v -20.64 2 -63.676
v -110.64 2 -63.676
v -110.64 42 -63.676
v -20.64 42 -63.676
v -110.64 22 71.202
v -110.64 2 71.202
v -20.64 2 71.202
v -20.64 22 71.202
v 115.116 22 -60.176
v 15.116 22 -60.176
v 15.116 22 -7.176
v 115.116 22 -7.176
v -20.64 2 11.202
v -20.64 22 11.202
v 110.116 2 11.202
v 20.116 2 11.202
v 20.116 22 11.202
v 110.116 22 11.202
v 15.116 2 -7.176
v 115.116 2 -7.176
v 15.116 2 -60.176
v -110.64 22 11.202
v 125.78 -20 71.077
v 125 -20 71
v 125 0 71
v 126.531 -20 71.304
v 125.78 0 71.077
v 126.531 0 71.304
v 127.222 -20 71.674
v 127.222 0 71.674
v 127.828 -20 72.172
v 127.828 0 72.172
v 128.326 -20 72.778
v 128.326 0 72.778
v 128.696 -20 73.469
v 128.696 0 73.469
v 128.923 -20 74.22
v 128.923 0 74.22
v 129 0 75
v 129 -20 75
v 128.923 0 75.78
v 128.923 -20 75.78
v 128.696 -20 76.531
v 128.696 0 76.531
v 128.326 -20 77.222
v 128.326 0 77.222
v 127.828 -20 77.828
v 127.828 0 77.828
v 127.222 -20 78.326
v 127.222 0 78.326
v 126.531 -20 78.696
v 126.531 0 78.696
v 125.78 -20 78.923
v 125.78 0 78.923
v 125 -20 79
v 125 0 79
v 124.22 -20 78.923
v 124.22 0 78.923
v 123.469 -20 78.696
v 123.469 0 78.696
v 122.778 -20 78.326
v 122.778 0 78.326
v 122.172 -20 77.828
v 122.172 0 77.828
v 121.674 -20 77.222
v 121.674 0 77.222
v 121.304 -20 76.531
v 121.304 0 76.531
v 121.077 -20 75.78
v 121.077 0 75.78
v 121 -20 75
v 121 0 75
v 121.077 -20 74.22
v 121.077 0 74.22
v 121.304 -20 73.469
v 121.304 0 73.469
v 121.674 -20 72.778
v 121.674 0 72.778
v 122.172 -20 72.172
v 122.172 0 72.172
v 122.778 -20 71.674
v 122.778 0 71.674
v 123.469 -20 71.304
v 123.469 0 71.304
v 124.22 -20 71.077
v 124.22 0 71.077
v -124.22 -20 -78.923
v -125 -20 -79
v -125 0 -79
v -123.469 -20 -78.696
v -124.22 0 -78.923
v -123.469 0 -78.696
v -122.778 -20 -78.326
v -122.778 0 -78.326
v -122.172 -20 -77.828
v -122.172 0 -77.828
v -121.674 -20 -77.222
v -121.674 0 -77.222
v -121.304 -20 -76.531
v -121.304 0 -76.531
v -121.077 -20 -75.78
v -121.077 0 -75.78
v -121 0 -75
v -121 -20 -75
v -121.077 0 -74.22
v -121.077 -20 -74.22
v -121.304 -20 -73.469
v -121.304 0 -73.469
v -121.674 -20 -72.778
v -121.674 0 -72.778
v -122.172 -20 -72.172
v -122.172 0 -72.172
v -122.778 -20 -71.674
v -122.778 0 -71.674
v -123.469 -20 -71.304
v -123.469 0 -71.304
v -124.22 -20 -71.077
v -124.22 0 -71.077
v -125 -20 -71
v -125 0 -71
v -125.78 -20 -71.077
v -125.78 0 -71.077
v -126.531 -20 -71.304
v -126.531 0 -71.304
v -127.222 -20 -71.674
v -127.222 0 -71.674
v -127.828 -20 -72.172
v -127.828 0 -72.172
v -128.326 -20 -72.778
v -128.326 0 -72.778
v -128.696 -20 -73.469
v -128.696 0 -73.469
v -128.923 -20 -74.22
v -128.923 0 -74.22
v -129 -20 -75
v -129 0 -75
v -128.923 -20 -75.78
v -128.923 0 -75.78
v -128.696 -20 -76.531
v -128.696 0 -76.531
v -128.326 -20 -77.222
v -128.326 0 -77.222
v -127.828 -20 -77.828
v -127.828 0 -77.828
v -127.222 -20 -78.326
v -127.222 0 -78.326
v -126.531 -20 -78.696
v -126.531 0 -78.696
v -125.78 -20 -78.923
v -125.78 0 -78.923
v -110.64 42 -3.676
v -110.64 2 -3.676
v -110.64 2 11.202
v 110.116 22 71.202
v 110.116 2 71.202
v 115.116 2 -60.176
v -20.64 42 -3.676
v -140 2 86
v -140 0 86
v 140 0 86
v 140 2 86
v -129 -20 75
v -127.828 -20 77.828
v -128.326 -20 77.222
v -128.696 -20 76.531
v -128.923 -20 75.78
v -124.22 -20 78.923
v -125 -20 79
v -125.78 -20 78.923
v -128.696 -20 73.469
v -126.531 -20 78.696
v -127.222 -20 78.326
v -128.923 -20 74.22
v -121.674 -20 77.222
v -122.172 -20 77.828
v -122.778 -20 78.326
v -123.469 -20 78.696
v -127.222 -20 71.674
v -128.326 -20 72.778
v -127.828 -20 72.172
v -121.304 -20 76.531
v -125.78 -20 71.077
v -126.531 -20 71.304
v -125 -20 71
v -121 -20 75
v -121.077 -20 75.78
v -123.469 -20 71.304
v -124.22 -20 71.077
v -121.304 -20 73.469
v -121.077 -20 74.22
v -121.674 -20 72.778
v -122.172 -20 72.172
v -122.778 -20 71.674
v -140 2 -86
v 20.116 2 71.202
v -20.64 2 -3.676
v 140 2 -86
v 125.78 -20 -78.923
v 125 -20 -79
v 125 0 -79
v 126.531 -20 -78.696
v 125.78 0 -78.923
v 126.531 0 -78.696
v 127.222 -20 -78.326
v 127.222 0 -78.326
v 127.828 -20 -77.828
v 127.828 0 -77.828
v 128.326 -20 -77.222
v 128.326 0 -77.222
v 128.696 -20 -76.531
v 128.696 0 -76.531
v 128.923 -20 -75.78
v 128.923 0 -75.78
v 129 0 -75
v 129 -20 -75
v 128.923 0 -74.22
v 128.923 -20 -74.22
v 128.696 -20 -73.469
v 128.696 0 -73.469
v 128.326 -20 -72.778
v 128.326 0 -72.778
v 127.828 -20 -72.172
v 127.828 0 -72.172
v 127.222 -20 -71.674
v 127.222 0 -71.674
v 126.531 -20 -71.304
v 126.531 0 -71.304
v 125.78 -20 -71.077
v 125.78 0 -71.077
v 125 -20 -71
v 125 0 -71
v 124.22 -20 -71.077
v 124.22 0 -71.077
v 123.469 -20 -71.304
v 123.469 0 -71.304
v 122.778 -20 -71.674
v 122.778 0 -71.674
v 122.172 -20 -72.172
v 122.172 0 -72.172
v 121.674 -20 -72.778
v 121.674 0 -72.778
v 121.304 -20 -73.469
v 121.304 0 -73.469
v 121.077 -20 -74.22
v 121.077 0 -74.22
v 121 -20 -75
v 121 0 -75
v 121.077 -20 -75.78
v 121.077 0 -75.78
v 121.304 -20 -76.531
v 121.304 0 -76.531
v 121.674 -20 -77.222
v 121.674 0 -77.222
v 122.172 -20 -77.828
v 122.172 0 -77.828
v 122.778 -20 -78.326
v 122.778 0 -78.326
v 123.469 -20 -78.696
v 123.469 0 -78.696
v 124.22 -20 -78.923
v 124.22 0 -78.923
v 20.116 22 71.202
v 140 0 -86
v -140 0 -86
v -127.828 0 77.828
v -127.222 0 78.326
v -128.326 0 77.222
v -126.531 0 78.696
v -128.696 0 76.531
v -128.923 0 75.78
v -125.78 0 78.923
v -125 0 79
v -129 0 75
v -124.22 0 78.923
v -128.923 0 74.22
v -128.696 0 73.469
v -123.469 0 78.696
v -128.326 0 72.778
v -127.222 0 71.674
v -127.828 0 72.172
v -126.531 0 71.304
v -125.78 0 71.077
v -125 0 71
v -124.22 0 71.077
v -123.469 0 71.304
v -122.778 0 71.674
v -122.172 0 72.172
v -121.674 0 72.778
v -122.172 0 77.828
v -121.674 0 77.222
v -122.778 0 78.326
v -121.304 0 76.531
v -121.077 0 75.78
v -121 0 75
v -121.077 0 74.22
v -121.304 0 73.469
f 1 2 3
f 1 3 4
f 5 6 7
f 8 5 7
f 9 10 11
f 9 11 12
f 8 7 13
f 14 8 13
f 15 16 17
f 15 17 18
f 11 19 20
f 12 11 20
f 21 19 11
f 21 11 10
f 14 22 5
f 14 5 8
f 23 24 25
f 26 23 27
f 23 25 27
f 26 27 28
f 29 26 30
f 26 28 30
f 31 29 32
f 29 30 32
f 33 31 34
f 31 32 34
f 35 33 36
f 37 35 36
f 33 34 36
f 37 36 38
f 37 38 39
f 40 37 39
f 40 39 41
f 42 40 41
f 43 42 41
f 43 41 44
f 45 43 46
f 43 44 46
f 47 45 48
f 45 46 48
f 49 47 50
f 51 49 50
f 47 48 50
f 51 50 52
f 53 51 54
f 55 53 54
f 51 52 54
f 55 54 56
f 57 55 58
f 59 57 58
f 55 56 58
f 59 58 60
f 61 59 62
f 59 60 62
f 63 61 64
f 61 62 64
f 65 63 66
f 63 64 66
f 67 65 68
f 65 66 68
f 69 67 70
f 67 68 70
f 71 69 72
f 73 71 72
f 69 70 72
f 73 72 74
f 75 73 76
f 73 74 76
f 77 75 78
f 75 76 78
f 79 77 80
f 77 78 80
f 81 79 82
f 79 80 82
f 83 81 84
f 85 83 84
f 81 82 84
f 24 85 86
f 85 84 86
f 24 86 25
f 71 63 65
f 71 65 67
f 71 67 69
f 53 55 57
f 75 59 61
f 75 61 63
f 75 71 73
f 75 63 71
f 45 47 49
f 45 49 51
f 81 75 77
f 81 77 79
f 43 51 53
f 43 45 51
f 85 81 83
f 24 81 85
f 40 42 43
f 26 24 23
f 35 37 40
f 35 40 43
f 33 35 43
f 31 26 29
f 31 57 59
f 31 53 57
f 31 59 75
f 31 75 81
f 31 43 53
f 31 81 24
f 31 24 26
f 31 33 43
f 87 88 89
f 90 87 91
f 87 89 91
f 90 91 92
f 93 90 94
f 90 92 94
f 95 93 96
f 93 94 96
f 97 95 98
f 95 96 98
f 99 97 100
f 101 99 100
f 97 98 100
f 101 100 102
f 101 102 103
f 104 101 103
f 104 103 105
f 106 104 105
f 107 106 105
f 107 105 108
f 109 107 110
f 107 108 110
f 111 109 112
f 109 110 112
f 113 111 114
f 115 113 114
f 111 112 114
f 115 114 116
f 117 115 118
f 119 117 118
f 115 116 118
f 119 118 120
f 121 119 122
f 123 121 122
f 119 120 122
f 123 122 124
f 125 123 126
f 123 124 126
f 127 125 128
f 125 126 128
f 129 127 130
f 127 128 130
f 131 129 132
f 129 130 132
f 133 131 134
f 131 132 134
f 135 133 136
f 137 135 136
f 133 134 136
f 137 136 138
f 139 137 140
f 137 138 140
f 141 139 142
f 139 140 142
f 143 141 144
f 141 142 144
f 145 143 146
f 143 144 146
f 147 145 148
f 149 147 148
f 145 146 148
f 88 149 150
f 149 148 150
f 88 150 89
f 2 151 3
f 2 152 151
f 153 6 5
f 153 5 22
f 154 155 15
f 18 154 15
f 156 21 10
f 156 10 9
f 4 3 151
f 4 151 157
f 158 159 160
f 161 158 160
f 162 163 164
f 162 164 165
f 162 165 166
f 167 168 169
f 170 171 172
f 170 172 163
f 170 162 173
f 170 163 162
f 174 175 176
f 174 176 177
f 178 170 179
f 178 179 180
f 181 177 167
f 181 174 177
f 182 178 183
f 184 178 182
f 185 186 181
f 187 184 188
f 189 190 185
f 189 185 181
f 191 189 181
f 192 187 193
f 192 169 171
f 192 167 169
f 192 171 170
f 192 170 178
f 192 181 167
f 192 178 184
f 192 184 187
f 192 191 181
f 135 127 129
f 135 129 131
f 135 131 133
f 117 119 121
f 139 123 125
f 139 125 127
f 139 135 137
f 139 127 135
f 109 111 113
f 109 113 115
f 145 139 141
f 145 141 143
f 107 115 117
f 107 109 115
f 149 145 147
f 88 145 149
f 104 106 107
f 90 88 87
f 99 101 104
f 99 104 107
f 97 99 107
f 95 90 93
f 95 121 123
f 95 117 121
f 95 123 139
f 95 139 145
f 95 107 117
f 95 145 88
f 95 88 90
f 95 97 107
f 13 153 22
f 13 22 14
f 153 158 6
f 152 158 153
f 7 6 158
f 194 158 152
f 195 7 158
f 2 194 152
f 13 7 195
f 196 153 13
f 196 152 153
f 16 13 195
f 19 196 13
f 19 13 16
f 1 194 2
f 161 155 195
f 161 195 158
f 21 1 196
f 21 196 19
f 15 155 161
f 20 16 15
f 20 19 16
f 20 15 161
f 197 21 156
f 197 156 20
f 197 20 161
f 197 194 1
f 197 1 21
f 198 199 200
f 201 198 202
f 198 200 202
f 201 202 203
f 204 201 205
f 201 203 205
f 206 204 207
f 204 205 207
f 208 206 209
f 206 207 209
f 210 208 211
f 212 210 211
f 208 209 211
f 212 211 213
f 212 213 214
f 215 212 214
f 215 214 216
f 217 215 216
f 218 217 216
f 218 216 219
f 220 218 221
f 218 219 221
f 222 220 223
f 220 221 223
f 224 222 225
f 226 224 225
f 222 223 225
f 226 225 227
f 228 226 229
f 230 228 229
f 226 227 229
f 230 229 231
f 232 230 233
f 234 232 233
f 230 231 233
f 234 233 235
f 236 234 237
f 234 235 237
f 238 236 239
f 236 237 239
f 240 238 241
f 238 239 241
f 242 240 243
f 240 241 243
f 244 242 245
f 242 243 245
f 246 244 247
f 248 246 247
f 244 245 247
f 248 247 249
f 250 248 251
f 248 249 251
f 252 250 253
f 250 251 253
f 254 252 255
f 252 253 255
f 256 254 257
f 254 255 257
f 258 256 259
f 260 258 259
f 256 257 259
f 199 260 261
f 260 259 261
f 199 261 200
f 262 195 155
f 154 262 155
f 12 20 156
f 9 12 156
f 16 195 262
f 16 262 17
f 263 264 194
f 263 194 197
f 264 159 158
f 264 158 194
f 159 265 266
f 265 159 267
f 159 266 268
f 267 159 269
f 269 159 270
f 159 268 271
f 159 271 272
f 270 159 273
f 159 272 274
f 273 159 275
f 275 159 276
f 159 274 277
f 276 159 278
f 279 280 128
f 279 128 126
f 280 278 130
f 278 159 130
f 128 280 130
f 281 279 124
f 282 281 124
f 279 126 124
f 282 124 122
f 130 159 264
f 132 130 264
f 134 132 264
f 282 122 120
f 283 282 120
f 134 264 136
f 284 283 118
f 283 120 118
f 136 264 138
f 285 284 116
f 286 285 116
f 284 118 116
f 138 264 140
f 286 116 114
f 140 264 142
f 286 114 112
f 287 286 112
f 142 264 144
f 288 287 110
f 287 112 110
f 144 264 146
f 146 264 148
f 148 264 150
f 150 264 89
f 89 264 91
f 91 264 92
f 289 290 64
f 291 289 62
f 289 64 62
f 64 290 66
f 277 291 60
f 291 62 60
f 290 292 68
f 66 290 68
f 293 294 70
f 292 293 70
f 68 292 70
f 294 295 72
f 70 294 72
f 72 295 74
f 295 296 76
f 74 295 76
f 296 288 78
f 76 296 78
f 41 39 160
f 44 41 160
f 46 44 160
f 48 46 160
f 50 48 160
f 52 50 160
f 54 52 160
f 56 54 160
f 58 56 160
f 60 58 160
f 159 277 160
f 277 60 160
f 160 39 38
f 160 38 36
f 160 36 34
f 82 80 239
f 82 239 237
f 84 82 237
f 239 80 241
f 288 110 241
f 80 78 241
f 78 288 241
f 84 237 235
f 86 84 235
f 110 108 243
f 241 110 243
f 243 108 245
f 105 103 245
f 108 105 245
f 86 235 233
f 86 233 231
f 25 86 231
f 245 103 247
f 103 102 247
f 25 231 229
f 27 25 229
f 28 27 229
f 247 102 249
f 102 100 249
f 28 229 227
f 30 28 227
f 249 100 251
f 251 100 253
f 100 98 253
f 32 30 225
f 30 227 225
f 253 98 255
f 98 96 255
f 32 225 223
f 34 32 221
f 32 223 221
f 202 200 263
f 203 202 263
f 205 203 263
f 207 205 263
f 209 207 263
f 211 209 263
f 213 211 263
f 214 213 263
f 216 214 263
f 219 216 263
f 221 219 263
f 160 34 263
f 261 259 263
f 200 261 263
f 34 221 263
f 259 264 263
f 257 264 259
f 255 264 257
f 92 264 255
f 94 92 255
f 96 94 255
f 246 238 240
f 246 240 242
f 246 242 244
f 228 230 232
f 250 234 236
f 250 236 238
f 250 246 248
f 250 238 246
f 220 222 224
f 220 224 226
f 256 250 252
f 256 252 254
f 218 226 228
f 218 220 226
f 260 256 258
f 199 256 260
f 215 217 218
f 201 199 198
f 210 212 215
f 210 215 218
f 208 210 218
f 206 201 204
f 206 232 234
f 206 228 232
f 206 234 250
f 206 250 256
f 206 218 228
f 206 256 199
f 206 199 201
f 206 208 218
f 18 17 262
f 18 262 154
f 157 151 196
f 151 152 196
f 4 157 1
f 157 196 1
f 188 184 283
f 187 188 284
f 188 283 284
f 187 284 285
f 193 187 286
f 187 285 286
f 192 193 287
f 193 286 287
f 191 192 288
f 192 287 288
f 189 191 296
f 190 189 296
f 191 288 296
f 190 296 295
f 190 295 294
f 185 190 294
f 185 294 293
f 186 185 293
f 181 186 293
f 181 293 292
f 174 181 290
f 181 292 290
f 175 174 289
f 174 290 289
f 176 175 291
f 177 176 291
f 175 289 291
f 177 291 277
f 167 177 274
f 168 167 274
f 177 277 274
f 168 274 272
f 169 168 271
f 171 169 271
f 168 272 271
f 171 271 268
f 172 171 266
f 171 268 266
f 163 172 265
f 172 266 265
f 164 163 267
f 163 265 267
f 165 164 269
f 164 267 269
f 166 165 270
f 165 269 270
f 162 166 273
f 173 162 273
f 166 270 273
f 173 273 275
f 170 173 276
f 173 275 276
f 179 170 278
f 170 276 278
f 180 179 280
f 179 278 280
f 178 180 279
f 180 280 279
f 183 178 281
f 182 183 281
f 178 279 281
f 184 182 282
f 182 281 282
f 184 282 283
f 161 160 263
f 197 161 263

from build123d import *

# Parameters (mm, degrees)
SKETCH_1_W      = 280
SKETCH_1_H      = 172
EXTRUDE_1_DEPTH = 2
SKETCH_2_W      = 90
SKETCH_2_H      = 60
SKETCH_2_W_2    = 100
SKETCH_2_H_2    = 53
EXTRUDE_2_DEPTH = 20
SKETCH_3_W      = 90
SKETCH_3_H      = 60
EXTRUDE_3_DEPTH = 20
SKETCH_4_R      = 4
EXTRUDE_4_DEPTH = 20


with BuildPart() as part:
    # Эскиз1 → Бобышка-Вытянуть1 (new body)
    with BuildSketch(Plane(origin=(0, 0, 0), x_dir=(1, 0, 0), z_dir=(0, 1, 0))):
        Rectangle(SKETCH_1_W, SKETCH_1_H)
    extrude(amount=EXTRUDE_1_DEPTH)

    # Эскиз2 → Бобышка-Вытянуть2 (add)
    with BuildSketch(Plane(origin=(0, 2, 0), x_dir=(1, 0, 0), z_dir=(0, 1, 0))):
        with Locations((-65.639881966, 33.675557069)):
            Rectangle(SKETCH_2_W, SKETCH_2_H)
        with Locations((-65.639881966, -41.201831045)):
            Rectangle(SKETCH_2_W, SKETCH_2_H)
        with Locations((65.116180532, -41.201831045)):
            Rectangle(SKETCH_2_W, SKETCH_2_H)
        with Locations((65.116180532, 33.675557069)):
            Rectangle(SKETCH_2_W_2, SKETCH_2_H_2)
    extrude(amount=EXTRUDE_2_DEPTH)

    # Эскиз3 → Бобышка-Вытянуть3 (add)
    with BuildSketch(Plane(origin=(0, 22, 0), x_dir=(1, 0, 0), z_dir=(0, 1, 0))):
        with Locations((-65.639881966, 33.675557069)):
            Rectangle(SKETCH_3_W, SKETCH_3_H)
    extrude(amount=EXTRUDE_3_DEPTH)

    # Эскиз4 → Бобышка-Вытянуть4 (add)
    with BuildSketch(Plane.XZ):
        with Locations(Location((-125, 75, 0), (0, 0, 270))):
            Circle(SKETCH_4_R)
        with Locations(Location((125, 75, 0), (0, 0, 270))):
            Circle(SKETCH_4_R)
        with Locations(Location((125, -75, 0), (0, 0, 270))):
            Circle(SKETCH_4_R)
        with Locations(Location((-125, -75, 0), (0, 0, 270))):
            Circle(SKETCH_4_R)
    extrude(amount=EXTRUDE_4_DEPTH)


solid = part.part
